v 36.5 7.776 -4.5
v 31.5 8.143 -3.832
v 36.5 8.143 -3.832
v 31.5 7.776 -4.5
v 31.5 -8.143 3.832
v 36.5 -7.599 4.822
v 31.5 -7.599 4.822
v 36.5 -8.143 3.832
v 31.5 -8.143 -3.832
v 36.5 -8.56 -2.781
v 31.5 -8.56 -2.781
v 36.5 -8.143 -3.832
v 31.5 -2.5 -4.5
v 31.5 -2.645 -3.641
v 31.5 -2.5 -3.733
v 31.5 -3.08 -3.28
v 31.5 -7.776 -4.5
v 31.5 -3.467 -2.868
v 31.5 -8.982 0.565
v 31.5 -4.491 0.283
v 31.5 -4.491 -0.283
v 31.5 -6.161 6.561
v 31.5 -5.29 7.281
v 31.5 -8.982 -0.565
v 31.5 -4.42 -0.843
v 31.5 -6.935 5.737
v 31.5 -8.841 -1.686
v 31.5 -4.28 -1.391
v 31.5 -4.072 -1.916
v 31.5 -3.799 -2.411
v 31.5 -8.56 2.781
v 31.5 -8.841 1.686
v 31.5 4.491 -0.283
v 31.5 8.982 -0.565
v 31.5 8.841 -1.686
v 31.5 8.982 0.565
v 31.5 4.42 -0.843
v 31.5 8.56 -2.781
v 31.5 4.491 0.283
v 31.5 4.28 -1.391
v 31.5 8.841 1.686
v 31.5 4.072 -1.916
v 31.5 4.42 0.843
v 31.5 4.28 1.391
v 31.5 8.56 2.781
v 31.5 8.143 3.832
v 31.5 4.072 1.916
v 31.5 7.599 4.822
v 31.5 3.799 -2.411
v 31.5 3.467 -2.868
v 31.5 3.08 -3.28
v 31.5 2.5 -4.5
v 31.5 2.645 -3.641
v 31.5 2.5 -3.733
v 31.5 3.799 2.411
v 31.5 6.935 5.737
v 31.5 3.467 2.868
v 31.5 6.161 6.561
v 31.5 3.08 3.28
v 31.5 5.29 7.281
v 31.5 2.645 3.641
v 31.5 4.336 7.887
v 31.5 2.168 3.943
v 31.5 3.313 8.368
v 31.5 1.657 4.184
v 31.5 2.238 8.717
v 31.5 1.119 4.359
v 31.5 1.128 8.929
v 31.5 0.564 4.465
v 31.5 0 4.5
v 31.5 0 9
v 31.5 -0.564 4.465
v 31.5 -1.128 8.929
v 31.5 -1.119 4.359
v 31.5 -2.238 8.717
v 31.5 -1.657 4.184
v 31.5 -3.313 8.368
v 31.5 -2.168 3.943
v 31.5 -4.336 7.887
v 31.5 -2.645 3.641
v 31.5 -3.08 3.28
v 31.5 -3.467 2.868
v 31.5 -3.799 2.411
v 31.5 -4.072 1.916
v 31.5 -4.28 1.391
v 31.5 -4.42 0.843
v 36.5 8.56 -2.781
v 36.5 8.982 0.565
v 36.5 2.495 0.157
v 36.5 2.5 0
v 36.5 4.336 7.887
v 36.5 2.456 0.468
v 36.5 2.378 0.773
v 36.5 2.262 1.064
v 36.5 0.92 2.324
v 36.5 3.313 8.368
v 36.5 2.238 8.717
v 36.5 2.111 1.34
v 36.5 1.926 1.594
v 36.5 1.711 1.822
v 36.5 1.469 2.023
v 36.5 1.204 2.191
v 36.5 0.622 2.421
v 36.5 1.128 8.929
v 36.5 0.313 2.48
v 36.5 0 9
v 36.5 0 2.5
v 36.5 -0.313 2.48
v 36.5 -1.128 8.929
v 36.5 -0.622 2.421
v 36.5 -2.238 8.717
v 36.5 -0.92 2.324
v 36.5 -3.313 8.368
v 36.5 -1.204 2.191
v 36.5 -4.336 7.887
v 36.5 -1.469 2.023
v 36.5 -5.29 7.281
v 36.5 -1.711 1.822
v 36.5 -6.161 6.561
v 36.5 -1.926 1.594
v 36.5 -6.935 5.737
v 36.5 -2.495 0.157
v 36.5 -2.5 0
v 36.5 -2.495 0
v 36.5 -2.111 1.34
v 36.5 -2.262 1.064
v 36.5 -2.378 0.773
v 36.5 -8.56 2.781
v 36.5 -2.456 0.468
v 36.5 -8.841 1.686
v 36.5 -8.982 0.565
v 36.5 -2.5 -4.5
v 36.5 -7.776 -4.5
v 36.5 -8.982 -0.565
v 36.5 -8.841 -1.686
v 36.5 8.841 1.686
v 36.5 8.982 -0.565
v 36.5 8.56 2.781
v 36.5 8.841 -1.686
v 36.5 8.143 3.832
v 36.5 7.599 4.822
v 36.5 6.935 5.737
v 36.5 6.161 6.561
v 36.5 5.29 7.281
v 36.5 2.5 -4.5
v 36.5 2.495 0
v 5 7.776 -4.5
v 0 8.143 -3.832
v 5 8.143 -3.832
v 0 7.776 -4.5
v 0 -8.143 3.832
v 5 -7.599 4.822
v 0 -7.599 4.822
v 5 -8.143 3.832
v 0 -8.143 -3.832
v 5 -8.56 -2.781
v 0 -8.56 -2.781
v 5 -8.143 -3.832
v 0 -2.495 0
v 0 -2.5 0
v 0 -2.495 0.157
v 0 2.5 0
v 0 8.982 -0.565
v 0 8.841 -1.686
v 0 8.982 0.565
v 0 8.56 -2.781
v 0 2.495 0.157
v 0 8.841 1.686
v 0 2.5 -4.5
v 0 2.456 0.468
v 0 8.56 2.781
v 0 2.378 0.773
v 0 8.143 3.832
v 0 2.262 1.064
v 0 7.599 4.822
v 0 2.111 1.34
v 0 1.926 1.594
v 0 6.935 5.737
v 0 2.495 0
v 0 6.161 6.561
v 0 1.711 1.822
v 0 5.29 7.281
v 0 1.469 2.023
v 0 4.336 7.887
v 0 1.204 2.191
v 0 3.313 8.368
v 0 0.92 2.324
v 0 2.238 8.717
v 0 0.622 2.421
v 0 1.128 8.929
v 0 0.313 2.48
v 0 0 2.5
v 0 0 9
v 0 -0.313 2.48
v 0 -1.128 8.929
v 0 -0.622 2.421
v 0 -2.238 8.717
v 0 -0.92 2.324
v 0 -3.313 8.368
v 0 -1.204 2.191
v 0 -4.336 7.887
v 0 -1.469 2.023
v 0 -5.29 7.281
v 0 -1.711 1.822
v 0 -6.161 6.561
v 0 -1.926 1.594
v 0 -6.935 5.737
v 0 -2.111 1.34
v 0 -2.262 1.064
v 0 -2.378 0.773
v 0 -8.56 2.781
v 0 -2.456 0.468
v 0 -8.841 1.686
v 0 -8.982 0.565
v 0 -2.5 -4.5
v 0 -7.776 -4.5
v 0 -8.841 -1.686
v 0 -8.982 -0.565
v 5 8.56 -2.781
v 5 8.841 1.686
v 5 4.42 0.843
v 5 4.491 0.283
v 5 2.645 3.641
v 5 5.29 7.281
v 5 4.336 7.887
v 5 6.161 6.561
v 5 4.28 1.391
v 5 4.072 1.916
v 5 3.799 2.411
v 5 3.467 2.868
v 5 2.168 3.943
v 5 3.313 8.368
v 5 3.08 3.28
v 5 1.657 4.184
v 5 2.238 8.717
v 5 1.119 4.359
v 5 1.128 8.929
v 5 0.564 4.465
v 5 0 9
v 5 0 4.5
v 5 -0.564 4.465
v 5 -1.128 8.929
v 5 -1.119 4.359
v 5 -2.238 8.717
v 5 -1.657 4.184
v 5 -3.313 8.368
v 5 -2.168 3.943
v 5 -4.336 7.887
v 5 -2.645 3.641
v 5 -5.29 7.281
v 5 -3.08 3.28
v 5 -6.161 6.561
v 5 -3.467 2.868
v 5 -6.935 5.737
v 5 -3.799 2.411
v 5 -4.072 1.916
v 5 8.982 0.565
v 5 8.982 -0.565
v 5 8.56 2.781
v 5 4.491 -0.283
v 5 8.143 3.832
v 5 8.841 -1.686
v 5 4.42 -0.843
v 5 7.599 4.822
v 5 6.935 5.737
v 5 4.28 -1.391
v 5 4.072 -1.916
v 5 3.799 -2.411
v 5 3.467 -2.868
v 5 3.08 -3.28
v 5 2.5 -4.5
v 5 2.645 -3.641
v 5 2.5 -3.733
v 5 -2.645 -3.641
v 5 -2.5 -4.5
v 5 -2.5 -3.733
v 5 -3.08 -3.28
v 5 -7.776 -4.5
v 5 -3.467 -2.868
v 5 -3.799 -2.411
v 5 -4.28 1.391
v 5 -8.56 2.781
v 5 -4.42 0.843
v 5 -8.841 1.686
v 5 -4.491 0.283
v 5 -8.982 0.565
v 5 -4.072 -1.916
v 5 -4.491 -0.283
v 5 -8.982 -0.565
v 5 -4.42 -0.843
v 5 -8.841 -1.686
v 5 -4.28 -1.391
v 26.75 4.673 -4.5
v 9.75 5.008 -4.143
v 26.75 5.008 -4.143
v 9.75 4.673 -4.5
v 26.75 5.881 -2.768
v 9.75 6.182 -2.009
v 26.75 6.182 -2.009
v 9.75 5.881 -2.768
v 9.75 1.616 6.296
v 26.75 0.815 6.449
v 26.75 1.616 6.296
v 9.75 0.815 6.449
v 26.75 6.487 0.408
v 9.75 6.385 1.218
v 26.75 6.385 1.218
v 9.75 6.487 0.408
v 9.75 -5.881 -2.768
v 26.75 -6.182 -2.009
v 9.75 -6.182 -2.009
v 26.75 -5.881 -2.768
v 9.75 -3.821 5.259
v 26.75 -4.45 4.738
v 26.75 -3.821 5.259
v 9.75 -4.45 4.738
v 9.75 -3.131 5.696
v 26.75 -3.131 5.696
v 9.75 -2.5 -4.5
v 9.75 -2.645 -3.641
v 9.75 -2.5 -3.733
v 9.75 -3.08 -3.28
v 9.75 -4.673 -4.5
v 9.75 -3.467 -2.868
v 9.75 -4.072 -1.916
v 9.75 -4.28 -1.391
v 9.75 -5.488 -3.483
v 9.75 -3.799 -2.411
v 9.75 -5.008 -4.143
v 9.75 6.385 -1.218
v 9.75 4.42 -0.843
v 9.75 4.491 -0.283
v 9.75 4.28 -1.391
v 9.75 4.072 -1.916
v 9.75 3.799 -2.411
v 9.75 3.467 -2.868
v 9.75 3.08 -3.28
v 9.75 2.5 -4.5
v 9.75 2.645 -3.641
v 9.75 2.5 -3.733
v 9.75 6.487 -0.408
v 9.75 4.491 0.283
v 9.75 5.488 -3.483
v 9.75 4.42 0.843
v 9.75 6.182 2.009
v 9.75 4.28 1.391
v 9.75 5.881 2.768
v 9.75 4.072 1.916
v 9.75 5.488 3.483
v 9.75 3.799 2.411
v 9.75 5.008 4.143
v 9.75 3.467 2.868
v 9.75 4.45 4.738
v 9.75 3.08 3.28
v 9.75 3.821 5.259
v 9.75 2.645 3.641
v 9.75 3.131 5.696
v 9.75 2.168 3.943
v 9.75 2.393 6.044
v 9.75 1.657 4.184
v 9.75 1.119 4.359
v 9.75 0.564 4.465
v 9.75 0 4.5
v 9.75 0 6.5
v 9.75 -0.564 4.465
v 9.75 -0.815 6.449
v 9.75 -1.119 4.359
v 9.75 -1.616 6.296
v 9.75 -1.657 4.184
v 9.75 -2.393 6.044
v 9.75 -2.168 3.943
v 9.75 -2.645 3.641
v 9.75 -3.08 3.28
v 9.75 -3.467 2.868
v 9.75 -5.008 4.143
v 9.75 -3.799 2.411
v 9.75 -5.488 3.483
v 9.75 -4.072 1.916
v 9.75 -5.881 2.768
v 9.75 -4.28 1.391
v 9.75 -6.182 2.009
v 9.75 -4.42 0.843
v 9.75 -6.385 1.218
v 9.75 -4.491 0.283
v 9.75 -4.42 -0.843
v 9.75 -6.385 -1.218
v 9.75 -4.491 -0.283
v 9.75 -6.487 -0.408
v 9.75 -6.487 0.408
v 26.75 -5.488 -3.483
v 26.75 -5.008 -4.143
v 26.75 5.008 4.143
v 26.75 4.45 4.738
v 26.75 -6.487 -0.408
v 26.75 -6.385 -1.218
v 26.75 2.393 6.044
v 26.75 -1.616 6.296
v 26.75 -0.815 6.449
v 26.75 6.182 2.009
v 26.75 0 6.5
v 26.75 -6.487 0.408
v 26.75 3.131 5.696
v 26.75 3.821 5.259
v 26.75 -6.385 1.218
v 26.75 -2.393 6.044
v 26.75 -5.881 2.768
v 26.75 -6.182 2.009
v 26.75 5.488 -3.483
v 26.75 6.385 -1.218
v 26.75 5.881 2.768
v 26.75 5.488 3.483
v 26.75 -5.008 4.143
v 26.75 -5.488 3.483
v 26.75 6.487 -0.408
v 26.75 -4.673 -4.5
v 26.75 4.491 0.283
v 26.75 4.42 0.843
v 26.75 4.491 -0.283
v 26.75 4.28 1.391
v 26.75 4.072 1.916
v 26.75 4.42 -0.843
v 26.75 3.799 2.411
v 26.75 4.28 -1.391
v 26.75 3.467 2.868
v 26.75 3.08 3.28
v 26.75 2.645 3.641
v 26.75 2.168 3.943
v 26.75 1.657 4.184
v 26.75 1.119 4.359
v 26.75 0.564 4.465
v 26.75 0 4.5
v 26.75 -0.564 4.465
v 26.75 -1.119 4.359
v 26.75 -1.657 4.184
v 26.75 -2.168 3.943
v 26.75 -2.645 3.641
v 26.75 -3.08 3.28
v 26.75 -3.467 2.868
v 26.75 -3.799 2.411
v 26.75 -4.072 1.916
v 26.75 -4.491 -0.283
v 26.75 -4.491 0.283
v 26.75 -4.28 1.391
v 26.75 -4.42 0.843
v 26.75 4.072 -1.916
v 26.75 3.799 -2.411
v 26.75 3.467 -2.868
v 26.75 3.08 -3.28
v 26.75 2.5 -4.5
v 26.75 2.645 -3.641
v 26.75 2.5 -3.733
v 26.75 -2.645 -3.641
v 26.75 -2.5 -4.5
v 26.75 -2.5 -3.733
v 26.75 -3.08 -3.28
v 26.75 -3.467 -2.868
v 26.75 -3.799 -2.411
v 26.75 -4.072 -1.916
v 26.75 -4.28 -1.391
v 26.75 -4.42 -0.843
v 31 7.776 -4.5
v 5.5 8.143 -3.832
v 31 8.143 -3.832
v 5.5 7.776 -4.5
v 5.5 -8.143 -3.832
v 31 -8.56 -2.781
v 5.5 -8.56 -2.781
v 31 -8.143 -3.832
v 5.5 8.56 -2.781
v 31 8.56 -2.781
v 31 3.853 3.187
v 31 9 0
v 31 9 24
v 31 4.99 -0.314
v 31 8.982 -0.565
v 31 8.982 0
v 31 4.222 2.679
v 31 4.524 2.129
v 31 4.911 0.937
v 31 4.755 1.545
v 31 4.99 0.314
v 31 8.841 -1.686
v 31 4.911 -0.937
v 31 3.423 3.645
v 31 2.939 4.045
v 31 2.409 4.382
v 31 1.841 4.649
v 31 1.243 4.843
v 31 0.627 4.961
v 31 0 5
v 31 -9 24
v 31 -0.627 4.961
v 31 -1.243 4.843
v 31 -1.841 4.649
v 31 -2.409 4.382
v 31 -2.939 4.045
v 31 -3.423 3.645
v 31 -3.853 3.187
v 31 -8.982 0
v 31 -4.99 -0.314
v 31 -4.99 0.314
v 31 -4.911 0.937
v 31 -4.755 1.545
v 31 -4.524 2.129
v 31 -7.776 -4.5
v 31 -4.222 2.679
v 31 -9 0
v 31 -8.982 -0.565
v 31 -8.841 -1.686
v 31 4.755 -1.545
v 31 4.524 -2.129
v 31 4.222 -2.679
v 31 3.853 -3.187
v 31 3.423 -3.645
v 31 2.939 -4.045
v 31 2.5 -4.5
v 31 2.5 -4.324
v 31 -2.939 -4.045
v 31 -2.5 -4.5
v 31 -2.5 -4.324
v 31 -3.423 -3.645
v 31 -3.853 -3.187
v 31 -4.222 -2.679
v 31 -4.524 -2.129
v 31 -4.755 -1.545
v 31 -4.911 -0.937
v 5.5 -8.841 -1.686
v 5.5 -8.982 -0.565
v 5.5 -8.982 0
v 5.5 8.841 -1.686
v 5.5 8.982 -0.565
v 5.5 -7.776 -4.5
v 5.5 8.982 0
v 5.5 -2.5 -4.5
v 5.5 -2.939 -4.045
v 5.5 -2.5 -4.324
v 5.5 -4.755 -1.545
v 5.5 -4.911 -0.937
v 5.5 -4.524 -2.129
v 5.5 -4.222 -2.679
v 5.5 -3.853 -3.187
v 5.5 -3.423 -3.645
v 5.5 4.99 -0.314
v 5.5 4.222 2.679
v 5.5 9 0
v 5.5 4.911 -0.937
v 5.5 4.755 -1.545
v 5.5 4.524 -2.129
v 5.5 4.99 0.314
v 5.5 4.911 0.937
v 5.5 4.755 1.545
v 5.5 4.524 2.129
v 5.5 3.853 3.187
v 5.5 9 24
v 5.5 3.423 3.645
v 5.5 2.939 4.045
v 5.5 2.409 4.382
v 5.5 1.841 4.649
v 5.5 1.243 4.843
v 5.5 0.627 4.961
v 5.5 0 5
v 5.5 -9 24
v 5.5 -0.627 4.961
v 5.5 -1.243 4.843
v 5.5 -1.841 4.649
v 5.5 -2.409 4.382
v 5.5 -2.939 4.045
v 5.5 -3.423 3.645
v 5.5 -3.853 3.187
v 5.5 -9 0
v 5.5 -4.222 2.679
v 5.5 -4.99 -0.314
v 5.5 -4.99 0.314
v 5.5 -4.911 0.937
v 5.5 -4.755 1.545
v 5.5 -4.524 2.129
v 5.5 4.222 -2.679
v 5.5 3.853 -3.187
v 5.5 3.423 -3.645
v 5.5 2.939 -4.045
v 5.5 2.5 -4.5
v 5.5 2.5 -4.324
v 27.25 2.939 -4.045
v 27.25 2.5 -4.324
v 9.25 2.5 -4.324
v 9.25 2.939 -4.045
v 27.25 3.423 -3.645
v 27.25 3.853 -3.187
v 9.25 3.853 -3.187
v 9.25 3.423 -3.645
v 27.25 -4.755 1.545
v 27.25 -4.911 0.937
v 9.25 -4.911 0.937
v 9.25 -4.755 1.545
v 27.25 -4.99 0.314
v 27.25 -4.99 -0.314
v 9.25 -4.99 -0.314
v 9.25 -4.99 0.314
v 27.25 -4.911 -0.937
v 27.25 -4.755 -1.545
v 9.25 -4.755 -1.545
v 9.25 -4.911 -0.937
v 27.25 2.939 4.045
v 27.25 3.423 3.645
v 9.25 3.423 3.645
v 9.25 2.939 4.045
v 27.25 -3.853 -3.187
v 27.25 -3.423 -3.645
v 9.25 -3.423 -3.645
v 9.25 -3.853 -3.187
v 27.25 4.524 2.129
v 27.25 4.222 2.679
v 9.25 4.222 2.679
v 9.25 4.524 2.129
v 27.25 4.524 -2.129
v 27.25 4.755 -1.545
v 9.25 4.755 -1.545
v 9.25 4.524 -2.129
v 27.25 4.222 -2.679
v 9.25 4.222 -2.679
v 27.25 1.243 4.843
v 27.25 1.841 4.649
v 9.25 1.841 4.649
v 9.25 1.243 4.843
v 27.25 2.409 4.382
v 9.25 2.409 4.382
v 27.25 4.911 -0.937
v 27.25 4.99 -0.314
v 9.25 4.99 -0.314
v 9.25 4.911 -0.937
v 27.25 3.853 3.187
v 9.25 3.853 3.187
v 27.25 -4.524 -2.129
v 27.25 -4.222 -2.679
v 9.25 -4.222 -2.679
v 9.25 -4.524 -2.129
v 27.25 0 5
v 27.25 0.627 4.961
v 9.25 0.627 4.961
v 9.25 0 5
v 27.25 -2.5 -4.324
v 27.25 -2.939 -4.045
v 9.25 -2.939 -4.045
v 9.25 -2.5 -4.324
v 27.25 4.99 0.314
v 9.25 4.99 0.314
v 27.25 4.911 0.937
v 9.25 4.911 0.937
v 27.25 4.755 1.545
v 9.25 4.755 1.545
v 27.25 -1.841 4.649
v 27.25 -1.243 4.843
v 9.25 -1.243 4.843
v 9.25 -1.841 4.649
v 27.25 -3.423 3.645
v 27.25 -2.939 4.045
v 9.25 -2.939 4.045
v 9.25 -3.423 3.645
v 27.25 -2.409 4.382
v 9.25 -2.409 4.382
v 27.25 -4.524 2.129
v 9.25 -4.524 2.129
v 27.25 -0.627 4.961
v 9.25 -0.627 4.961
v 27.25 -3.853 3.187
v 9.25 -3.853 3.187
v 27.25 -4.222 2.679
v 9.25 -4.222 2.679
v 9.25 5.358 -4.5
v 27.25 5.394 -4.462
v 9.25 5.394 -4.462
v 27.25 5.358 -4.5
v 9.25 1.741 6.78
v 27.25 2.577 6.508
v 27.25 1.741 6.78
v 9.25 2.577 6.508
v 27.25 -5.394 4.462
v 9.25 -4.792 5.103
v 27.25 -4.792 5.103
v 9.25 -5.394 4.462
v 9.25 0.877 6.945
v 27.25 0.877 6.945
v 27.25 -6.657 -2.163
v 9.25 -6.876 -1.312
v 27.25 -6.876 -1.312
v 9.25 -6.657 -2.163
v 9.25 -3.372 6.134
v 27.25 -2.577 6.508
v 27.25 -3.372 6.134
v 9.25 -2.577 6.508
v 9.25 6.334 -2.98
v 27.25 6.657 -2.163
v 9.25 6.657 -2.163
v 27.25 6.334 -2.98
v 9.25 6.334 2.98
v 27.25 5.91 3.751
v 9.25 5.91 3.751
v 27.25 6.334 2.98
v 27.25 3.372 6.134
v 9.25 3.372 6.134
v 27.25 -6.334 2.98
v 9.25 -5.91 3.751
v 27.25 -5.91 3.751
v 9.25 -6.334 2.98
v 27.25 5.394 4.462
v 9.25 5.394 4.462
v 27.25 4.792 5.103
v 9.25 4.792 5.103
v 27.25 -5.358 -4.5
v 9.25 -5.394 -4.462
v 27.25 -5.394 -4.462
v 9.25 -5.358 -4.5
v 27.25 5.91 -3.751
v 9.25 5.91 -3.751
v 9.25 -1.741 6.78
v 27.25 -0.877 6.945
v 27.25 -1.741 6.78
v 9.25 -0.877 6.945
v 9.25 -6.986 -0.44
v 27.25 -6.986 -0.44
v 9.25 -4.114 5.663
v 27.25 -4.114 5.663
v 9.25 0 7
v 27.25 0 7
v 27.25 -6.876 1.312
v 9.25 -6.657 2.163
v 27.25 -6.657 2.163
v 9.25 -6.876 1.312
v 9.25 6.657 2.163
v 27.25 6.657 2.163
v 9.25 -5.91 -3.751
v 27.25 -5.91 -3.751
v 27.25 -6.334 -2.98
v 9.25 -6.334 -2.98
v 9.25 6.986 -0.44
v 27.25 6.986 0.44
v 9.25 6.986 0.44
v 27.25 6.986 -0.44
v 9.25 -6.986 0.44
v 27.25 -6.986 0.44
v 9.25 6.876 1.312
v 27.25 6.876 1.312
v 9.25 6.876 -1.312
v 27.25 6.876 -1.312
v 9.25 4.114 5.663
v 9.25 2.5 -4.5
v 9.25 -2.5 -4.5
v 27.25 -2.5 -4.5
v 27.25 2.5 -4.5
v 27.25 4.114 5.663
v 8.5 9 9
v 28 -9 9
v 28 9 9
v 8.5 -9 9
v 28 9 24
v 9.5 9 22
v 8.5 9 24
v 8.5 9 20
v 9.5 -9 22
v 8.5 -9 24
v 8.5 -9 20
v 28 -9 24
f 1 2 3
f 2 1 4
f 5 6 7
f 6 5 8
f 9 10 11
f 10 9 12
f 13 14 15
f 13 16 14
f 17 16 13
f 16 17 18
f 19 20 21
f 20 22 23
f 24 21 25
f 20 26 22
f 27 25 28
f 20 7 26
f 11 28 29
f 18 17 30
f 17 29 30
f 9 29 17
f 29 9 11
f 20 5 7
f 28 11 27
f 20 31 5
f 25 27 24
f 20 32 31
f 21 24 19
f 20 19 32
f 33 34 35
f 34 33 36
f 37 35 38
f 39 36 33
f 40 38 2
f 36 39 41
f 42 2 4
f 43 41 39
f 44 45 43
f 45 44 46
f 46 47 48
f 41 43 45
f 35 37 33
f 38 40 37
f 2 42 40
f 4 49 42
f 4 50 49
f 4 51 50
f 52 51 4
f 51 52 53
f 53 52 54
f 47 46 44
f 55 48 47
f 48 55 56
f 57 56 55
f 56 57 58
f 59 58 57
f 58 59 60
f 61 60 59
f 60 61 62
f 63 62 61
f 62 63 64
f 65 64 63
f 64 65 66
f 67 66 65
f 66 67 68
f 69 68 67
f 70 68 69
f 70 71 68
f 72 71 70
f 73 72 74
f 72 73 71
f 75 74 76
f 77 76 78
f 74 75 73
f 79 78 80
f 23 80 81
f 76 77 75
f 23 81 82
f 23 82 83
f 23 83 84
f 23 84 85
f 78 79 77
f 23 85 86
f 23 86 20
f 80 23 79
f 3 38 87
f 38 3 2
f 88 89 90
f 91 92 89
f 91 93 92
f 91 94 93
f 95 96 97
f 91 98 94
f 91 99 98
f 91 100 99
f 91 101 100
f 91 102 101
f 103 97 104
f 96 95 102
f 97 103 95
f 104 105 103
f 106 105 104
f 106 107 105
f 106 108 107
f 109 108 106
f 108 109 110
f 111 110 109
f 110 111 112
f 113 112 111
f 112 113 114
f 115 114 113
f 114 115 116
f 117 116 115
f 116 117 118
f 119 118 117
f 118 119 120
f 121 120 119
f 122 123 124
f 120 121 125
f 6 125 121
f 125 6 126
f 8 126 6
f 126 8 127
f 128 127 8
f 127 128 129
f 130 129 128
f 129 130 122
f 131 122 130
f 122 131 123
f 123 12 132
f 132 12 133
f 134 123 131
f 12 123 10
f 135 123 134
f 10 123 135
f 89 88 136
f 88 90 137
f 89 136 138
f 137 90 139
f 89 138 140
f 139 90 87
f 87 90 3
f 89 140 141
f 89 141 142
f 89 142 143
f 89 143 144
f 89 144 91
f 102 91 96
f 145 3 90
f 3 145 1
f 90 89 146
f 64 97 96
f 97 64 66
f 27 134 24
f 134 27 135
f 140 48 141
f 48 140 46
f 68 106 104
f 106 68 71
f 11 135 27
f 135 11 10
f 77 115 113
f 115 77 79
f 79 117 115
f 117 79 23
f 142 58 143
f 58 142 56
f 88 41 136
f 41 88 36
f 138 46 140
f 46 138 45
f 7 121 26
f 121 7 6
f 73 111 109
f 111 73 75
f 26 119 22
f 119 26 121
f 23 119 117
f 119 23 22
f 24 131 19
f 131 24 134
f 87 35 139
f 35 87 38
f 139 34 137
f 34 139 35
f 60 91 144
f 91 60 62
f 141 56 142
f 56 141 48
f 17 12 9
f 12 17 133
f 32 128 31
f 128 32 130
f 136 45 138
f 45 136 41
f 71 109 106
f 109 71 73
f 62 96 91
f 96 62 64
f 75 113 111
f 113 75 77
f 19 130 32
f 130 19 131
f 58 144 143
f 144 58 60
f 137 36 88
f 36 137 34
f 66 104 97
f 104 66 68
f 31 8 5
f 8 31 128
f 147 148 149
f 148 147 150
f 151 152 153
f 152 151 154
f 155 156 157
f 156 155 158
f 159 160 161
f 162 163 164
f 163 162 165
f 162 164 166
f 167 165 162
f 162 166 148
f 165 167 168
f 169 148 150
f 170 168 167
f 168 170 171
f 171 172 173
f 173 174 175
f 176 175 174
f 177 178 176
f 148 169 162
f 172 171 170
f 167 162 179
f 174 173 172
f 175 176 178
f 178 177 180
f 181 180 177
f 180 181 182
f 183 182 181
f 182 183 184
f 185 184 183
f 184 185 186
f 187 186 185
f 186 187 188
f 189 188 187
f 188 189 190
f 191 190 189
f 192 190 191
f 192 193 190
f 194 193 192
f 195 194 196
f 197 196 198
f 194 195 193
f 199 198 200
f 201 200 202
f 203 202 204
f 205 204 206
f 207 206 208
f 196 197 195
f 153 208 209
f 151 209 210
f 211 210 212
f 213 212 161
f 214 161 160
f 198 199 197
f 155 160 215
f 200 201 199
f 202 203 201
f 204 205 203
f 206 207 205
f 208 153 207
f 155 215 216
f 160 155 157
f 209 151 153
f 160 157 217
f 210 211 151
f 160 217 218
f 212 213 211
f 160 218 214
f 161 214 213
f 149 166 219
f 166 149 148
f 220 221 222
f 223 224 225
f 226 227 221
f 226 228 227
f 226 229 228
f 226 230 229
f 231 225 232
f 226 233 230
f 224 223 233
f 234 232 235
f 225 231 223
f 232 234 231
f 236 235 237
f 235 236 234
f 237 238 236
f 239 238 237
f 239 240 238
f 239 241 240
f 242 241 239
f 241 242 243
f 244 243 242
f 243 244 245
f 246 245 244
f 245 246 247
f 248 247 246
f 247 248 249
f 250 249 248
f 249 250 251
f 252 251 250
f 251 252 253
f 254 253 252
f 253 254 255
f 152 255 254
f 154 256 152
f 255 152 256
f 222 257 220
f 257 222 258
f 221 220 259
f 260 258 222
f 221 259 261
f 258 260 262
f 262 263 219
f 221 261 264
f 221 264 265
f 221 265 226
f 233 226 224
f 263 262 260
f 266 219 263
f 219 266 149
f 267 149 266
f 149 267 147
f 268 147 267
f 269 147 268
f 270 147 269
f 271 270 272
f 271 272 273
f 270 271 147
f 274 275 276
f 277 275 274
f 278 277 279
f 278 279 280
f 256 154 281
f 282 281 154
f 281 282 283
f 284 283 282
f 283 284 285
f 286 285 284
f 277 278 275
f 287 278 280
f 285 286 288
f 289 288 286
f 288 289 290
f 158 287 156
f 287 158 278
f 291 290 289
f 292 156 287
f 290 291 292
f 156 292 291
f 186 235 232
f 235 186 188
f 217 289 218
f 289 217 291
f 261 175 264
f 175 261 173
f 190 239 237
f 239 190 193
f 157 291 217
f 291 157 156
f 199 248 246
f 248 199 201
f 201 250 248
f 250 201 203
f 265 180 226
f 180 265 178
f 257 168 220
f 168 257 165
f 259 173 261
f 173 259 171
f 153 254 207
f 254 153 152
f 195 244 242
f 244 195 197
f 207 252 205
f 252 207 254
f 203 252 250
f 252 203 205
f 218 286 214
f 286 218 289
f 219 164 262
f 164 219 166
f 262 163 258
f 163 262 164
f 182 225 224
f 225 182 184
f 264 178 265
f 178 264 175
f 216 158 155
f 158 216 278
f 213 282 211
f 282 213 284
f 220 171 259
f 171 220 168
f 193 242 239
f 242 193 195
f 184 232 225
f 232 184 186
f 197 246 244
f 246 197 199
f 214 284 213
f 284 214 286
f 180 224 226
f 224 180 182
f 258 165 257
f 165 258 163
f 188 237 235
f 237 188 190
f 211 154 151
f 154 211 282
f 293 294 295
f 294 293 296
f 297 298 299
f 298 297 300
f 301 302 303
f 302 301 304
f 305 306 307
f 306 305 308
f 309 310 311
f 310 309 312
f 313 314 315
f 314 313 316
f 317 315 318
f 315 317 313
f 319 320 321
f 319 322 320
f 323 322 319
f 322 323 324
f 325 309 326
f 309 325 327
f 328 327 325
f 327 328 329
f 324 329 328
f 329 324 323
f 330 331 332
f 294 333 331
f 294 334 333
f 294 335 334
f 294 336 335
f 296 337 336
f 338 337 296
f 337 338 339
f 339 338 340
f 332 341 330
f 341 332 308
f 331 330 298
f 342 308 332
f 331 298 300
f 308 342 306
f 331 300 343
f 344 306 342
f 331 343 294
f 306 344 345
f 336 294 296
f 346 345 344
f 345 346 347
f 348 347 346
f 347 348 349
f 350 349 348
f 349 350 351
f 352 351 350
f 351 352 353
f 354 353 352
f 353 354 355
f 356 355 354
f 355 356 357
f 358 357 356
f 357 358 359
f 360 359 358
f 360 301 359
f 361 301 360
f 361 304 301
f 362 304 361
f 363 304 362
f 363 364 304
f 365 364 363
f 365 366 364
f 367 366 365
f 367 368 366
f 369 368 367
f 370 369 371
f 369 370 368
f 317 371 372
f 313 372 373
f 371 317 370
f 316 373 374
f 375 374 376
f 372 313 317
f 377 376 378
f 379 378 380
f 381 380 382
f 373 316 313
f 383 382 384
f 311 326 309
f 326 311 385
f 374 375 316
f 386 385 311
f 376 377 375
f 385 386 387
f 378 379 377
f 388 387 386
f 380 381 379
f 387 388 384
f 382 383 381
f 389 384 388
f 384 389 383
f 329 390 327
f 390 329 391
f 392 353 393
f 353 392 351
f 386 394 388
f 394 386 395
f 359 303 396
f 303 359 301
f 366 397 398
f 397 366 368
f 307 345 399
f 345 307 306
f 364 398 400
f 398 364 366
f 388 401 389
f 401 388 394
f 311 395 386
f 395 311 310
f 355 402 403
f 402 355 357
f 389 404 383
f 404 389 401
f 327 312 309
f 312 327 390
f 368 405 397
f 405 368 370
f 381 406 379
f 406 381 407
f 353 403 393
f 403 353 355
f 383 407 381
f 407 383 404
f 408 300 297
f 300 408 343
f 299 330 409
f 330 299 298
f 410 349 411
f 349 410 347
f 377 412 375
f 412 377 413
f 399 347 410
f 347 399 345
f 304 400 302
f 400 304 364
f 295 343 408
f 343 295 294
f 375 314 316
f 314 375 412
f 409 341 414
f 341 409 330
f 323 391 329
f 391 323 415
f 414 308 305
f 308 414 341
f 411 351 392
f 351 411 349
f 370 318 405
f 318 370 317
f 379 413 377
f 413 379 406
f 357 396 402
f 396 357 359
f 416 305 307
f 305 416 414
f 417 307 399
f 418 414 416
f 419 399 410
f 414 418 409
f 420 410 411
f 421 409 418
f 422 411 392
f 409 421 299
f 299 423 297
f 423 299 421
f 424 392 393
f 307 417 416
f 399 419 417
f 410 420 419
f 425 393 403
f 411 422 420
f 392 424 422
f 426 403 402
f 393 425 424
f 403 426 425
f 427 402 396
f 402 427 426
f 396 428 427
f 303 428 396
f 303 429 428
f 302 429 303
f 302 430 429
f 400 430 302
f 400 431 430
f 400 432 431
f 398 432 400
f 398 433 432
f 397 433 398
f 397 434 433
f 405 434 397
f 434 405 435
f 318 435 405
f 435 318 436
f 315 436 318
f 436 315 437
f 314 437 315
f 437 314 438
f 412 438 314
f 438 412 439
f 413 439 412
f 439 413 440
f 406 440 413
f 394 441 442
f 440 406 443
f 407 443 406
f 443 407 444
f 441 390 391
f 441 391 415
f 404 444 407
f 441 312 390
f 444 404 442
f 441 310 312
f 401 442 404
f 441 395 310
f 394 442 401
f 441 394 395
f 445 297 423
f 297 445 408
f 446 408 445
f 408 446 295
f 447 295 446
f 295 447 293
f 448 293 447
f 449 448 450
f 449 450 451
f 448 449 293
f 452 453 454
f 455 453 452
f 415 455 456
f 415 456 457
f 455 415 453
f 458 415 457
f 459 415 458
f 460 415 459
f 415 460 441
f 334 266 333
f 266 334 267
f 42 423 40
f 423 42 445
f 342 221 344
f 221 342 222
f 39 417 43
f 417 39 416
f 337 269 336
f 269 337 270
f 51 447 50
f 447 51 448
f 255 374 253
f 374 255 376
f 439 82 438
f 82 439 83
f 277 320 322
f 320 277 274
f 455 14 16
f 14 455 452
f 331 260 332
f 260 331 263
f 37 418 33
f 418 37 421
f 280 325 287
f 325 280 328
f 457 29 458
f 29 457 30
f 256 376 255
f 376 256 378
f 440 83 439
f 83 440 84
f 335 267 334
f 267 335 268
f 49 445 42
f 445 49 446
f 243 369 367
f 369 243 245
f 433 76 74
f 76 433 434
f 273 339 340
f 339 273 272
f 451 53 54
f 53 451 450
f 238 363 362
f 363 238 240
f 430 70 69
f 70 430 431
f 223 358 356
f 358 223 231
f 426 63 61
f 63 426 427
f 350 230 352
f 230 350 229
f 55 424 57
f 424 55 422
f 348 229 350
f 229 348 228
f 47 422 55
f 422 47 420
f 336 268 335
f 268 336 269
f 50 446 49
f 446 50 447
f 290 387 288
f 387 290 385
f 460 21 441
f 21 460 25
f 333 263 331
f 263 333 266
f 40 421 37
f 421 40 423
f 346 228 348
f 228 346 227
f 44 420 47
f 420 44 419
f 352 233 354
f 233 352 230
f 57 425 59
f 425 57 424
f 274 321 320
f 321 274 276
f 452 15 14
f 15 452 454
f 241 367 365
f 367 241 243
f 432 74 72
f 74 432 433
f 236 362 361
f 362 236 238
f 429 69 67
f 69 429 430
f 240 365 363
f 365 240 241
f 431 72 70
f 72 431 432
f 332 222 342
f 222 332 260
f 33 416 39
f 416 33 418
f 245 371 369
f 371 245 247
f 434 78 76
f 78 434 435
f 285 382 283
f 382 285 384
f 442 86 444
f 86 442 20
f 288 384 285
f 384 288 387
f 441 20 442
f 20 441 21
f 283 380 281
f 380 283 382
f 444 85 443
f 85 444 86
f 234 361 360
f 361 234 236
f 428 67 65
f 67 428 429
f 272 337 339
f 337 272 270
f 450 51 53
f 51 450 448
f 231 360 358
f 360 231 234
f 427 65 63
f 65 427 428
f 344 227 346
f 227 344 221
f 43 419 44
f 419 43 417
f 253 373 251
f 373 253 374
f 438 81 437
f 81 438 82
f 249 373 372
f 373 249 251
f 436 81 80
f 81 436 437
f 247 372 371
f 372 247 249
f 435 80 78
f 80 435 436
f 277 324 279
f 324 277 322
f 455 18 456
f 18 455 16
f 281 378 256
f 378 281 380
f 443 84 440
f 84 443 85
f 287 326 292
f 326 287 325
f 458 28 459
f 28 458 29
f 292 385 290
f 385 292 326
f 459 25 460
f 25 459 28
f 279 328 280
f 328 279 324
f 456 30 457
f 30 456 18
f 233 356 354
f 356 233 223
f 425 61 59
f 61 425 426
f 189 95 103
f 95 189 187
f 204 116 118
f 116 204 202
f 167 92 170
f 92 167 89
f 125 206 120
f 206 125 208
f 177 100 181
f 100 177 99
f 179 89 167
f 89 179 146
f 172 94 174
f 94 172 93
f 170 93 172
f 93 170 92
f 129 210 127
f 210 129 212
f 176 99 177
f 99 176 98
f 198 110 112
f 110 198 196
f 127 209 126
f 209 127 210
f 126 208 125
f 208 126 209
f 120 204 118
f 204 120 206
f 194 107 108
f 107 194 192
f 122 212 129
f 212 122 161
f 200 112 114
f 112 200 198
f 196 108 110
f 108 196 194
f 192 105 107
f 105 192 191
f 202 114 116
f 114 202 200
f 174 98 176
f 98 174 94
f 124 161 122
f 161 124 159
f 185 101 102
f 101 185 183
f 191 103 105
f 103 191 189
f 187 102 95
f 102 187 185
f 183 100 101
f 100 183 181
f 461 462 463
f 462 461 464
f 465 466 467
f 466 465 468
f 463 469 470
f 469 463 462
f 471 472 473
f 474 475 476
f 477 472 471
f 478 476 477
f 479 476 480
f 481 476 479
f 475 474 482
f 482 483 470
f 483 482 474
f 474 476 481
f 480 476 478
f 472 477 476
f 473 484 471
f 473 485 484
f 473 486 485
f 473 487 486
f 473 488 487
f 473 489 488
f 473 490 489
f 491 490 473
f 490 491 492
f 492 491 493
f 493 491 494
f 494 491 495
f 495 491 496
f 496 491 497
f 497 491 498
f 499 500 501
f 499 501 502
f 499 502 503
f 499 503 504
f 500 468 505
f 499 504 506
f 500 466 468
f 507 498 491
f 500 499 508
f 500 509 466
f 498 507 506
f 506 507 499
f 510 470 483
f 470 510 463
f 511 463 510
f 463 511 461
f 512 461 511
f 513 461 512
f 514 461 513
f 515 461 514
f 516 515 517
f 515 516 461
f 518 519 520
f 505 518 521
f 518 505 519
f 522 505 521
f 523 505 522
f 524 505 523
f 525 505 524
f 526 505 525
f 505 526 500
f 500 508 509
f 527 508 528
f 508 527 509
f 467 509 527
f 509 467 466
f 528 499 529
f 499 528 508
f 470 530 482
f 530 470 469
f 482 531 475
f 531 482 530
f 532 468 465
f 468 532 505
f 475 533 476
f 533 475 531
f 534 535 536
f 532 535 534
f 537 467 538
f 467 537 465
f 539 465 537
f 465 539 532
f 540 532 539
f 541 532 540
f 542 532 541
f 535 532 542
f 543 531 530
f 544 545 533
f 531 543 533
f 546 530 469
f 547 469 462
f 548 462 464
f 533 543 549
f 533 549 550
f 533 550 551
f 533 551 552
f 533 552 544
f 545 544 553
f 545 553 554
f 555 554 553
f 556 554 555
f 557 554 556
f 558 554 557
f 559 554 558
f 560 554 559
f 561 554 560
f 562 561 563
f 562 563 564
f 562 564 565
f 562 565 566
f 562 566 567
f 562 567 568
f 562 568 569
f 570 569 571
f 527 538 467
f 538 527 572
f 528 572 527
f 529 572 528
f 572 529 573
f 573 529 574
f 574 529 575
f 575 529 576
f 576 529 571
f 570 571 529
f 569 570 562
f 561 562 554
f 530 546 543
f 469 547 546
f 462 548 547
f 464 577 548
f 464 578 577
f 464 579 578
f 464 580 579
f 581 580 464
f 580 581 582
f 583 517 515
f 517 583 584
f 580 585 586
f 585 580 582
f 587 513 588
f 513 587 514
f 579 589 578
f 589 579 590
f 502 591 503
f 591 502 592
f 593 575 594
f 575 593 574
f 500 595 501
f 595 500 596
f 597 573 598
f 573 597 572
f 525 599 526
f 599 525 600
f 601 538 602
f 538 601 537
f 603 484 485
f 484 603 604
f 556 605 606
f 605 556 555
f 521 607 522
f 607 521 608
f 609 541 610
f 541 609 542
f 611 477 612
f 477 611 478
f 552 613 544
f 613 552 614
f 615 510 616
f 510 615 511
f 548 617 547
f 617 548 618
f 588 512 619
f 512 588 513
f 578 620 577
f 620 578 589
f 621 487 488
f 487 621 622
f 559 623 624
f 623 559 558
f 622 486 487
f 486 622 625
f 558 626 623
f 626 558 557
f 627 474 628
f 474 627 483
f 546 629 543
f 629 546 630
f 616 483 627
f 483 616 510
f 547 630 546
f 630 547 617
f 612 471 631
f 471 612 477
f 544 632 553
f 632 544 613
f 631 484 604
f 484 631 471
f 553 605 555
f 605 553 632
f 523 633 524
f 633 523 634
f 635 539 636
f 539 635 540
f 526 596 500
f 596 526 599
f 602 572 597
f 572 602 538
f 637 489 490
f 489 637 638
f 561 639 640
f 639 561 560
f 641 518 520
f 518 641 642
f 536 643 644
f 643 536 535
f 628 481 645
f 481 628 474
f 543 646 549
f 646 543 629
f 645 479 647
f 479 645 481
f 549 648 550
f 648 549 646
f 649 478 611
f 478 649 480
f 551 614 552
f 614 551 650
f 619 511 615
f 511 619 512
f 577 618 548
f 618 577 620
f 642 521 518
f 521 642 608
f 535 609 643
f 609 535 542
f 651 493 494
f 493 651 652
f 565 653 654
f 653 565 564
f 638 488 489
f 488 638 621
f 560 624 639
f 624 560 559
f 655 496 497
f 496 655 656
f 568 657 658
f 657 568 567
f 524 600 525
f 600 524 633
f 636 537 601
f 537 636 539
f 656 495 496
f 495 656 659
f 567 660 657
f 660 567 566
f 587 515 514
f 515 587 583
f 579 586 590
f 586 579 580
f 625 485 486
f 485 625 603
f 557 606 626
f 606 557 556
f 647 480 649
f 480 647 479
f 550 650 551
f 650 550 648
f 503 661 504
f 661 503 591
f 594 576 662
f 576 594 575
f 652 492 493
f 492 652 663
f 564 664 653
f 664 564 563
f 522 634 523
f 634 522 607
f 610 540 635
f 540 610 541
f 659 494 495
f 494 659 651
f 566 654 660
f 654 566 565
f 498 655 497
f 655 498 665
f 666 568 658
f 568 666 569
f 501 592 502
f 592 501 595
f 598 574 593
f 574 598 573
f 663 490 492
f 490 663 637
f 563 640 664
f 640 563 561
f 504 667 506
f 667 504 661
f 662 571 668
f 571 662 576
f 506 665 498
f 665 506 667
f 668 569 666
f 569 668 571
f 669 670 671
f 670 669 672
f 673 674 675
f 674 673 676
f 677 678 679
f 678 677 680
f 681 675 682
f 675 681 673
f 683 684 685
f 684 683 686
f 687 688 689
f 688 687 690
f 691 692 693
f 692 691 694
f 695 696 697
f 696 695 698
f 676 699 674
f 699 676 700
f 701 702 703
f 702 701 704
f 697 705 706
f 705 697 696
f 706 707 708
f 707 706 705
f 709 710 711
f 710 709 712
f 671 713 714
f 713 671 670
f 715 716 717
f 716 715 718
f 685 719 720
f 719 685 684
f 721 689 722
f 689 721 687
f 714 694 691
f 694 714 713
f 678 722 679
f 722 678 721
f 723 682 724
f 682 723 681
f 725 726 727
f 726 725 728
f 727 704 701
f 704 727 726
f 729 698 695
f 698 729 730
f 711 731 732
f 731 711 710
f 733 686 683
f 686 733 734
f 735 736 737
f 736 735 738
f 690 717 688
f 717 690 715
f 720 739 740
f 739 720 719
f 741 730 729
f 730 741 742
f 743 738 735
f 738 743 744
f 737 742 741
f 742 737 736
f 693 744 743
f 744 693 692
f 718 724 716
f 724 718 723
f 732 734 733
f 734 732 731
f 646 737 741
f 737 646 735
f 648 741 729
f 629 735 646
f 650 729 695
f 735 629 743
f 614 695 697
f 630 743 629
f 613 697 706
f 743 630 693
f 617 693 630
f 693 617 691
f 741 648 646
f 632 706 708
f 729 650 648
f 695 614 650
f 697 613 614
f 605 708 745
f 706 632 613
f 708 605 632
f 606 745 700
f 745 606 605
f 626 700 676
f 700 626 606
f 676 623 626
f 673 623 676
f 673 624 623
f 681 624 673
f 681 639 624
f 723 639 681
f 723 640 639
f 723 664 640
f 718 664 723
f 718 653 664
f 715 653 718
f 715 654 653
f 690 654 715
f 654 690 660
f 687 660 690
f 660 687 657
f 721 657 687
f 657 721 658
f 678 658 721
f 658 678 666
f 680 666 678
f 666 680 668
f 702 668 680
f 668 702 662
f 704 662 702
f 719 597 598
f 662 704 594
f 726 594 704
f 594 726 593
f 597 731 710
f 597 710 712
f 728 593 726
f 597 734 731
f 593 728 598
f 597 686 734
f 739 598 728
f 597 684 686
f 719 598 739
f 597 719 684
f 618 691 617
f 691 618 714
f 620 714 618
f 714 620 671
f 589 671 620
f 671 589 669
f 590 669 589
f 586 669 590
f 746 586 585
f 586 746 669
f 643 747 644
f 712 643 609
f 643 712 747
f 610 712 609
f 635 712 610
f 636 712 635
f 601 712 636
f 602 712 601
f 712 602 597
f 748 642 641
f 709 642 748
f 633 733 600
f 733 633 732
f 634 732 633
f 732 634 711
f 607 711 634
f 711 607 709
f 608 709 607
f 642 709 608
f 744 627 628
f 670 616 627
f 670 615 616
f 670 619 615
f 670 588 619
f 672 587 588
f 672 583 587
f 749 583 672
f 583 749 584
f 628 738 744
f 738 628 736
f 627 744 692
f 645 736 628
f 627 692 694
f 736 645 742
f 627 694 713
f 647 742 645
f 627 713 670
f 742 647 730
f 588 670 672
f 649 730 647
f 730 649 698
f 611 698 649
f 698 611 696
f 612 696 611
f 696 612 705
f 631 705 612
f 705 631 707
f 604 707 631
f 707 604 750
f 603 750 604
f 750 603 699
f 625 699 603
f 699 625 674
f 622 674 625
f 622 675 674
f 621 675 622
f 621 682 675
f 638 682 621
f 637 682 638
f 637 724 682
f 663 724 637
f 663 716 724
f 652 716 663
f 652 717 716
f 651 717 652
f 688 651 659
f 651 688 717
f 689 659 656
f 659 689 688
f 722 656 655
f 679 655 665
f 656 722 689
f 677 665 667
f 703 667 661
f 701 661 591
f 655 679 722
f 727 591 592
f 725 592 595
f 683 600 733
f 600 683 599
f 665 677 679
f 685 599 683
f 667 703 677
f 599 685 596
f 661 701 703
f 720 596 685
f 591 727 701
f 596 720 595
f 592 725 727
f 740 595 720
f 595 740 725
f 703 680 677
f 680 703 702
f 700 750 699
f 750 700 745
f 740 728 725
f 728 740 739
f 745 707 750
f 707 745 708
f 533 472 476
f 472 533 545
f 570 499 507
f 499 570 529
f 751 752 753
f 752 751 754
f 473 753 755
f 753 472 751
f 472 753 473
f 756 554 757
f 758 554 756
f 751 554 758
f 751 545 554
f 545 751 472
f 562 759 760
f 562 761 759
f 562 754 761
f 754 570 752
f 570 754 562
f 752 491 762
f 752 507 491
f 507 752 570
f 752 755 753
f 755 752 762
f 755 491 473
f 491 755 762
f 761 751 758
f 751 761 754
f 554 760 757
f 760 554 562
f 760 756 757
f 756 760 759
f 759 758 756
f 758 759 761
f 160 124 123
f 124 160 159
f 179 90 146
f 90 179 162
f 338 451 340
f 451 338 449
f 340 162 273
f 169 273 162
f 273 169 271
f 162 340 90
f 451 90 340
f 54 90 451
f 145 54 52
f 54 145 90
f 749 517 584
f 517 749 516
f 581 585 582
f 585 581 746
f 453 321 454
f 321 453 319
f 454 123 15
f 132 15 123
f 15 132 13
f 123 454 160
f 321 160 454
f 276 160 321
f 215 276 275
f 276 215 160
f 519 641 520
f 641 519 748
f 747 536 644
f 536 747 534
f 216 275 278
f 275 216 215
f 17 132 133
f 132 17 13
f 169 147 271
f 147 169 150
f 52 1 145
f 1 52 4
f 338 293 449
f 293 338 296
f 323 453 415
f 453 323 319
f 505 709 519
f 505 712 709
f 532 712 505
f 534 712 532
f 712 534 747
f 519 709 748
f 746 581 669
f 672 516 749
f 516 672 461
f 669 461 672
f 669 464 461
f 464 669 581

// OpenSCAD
/* [PrintOptions] */
// preview[view:south east, tilt:bottom diagonal]

// splits the cable holder into 2 parts for printing if your machine doesn't do well with printing tight tolerances
show_seperate = "no"; // [yes, no]

/* [Basic] */
// is the diameter of the cable in mm to be held by the cable holder
cable_diameter = 5;
// sets the distance between the holding tabs in mm
table_thickness = 19.5;
// controls the distance between moving parts of the cable holder
tolerance = 0.5;


/* [Table_tabs] */
// adjusts the length of the tabs in mm that will hold the cable holder on to the table
tab_length = 15;
// adjusts how thick the tabs that hold the cable holder to the table should be in mm
tab_thickness = 3;

/* [Table_grip] */
// adjusts the triangular grip protrusion height in mm
grip_height = 1;
// adjusts the base width of the triangular grip protrusion in mm
grip_width = 4;

/* [Thumbwheels] */
//controls how tall the end thumbwheels should be in mm
thumbwheel_height = 5;

/* [Advanced] */
// is confusing name, just play with it and see what it does
retainer_factor = 6; // [3, 4, 5, 6, 7, 8, 9, 10]
// is another one to play around with.  Choose values between 0 and 2
plane_cut_factor = 1;
// is the quality of the cylinders
$fn = 50;

/* [Advanced_neck] */
// is the thickness of the inner rotating cuff in mm
neck_thickness = 2;

/* [Advanced_holder] */
// controls the overall thickness of the outer holder in mm
holder_thickness = 4;

/* [Hidden] */
barrel_lift_factor = 1/retainer_factor;
barrel_thickness = holder_thickness/2;

holder_height = 2*tab_thickness + table_thickness;
holder_diameter = cable_diameter + 2*neck_thickness + 2*tolerance + 2*holder_thickness;
plane_cut_depth = plane_cut_factor*(cable_diameter/2 + neck_thickness);

preview_tab = "";

rotate([0,90,0]) difference()
{

	// main holder barrels and tabs
	union()
	{
		// inner barrel
		
		if(show_seperate == "no")
		{
			InnerBarrel();
		}
		else
		{
			translate([0, holder_diameter + 5, 0]) 
			difference()
			{
				InnerBarrel();
				// cable notch
				translate([0, -cable_diameter/2, -0.5]) cube([holder_diameter/2 + 0.5, cable_diameter, thumbwheel_height + tolerance + holder_height + tolerance + thumbwheel_height + 1]);
				// plane slice
				translate([plane_cut_depth, -(holder_diameter + 1)/2, -0.5]) cube([holder_diameter/2 + 0.5, holder_diameter + 1, thumbwheel_height + tolerance + holder_height + tolerance + thumbwheel_height + 1]);
			}
		}
		
		// outer holder barrel
		highlight("Advanced_holder") difference()
		{
			// main body of the holder
			translate([0,0, thumbwheel_height + tolerance]) cylinder(r = holder_diameter/2, h = holder_height);
			
			// tolerance for neck
			translate([0,0,thumbwheel_height + tolerance + -0.5]) cylinder(r = cable_diameter/2 + neck_thickness + tolerance, h = holder_height + 1);
			// tolerance for the barrel
			translate([0,0, thumbwheel_height + tolerance + barrel_lift_factor*holder_height-tolerance]) cylinder(r = cable_diameter/2 + neck_thickness + barrel_thickness + tolerance, h = holder_height*(1-2*barrel_lift_factor) + 2*tolerance);
		}
		
		// main body holder
		union()
		{
			// upper tab
			highlight("Table_tabs") translate([-tab_length - holder_diameter/2, -holder_diameter/2, thumbwheel_height + tolerance + holder_height - tab_thickness]) cube([tab_length + 0.1, holder_diameter, tab_thickness]);
			// lower tab
			highlight("Table_tabs")translate([-tab_length - holder_diameter/2, -holder_diameter/2, thumbwheel_height + tolerance]) cube([tab_length + 0.1, holder_diameter, tab_thickness]);
			// lower grip
			highlight("Table_grip") translate([-tab_length - holder_diameter/2, holder_diameter/2,  thumbwheel_height + tolerance + tab_thickness]) rotate([90, 0, 0]) linear_extrude(height = holder_diameter, convexity = 10) polygon(points = [[0,0], [grip_width/2,grip_height], [grip_width,0], [grip_width,-0.1], [0,-0.1]]);
			
			// body block to  cylinder
			highlight("Advanced_holder") difference()
			{
				// main body block
				translate([-holder_diameter/2, -holder_diameter/2, thumbwheel_height + tolerance]) cube([holder_diameter/2, holder_diameter, holder_height]);
				// cylinder cut
				translate([0,0, thumbwheel_height + tolerance - 0.1]) cylinder(r = holder_diameter/2, h = holder_height + 1);
			}
		}
	}

	// cable notch
	translate([0, -cable_diameter/2, -0.5]) cube([holder_diameter/2 + 0.5, cable_diameter, thumbwheel_height + tolerance + holder_height + tolerance + thumbwheel_height + 1]);
	// plane slice
	translate([plane_cut_depth, -(holder_diameter + 1)/2, -0.5]) cube([holder_diameter/2 + 0.5, holder_diameter + 1, thumbwheel_height + tolerance + holder_height + tolerance + thumbwheel_height + 1]);
}

module InnerBarrel()
{
	difference()
		{
			union()
			{
				// top thumbwheel
				highlight("Thumbwheels") translate([0,0, thumbwheel_height + tolerance + holder_height+tolerance]) cylinder(r = holder_diameter/2, h = thumbwheel_height);
				// bottom thumbwheel
				highlight("Thumbwheels") cylinder(r = holder_diameter/2, h = thumbwheel_height);
				// retaining barrel
				translate([0,0, thumbwheel_height + tolerance + barrel_lift_factor*holder_height]) cylinder(r = cable_diameter/2 + neck_thickness + barrel_thickness, h = holder_height*(1-2*barrel_lift_factor));
				// the main barrel, or the "neck"
				highlight("Advanced_neck") cylinder(r = cable_diameter/2 + neck_thickness, h =thumbwheel_height + tolerance +  holder_height + tolerance + thumbwheel_height);
			}

			// The hole for the cable to go through
			translate([0,0,-.5]) cylinder(r = cable_diameter/2, h = thumbwheel_height + tolerance + holder_height + tolerance + thumbwheel_height + 1);
		}
}

module highlight(this_tab)
{
	if(preview_tab == this_tab)
	{
		color("red") child(0);
	}
	else
	{	
		child(0);
	}
}
